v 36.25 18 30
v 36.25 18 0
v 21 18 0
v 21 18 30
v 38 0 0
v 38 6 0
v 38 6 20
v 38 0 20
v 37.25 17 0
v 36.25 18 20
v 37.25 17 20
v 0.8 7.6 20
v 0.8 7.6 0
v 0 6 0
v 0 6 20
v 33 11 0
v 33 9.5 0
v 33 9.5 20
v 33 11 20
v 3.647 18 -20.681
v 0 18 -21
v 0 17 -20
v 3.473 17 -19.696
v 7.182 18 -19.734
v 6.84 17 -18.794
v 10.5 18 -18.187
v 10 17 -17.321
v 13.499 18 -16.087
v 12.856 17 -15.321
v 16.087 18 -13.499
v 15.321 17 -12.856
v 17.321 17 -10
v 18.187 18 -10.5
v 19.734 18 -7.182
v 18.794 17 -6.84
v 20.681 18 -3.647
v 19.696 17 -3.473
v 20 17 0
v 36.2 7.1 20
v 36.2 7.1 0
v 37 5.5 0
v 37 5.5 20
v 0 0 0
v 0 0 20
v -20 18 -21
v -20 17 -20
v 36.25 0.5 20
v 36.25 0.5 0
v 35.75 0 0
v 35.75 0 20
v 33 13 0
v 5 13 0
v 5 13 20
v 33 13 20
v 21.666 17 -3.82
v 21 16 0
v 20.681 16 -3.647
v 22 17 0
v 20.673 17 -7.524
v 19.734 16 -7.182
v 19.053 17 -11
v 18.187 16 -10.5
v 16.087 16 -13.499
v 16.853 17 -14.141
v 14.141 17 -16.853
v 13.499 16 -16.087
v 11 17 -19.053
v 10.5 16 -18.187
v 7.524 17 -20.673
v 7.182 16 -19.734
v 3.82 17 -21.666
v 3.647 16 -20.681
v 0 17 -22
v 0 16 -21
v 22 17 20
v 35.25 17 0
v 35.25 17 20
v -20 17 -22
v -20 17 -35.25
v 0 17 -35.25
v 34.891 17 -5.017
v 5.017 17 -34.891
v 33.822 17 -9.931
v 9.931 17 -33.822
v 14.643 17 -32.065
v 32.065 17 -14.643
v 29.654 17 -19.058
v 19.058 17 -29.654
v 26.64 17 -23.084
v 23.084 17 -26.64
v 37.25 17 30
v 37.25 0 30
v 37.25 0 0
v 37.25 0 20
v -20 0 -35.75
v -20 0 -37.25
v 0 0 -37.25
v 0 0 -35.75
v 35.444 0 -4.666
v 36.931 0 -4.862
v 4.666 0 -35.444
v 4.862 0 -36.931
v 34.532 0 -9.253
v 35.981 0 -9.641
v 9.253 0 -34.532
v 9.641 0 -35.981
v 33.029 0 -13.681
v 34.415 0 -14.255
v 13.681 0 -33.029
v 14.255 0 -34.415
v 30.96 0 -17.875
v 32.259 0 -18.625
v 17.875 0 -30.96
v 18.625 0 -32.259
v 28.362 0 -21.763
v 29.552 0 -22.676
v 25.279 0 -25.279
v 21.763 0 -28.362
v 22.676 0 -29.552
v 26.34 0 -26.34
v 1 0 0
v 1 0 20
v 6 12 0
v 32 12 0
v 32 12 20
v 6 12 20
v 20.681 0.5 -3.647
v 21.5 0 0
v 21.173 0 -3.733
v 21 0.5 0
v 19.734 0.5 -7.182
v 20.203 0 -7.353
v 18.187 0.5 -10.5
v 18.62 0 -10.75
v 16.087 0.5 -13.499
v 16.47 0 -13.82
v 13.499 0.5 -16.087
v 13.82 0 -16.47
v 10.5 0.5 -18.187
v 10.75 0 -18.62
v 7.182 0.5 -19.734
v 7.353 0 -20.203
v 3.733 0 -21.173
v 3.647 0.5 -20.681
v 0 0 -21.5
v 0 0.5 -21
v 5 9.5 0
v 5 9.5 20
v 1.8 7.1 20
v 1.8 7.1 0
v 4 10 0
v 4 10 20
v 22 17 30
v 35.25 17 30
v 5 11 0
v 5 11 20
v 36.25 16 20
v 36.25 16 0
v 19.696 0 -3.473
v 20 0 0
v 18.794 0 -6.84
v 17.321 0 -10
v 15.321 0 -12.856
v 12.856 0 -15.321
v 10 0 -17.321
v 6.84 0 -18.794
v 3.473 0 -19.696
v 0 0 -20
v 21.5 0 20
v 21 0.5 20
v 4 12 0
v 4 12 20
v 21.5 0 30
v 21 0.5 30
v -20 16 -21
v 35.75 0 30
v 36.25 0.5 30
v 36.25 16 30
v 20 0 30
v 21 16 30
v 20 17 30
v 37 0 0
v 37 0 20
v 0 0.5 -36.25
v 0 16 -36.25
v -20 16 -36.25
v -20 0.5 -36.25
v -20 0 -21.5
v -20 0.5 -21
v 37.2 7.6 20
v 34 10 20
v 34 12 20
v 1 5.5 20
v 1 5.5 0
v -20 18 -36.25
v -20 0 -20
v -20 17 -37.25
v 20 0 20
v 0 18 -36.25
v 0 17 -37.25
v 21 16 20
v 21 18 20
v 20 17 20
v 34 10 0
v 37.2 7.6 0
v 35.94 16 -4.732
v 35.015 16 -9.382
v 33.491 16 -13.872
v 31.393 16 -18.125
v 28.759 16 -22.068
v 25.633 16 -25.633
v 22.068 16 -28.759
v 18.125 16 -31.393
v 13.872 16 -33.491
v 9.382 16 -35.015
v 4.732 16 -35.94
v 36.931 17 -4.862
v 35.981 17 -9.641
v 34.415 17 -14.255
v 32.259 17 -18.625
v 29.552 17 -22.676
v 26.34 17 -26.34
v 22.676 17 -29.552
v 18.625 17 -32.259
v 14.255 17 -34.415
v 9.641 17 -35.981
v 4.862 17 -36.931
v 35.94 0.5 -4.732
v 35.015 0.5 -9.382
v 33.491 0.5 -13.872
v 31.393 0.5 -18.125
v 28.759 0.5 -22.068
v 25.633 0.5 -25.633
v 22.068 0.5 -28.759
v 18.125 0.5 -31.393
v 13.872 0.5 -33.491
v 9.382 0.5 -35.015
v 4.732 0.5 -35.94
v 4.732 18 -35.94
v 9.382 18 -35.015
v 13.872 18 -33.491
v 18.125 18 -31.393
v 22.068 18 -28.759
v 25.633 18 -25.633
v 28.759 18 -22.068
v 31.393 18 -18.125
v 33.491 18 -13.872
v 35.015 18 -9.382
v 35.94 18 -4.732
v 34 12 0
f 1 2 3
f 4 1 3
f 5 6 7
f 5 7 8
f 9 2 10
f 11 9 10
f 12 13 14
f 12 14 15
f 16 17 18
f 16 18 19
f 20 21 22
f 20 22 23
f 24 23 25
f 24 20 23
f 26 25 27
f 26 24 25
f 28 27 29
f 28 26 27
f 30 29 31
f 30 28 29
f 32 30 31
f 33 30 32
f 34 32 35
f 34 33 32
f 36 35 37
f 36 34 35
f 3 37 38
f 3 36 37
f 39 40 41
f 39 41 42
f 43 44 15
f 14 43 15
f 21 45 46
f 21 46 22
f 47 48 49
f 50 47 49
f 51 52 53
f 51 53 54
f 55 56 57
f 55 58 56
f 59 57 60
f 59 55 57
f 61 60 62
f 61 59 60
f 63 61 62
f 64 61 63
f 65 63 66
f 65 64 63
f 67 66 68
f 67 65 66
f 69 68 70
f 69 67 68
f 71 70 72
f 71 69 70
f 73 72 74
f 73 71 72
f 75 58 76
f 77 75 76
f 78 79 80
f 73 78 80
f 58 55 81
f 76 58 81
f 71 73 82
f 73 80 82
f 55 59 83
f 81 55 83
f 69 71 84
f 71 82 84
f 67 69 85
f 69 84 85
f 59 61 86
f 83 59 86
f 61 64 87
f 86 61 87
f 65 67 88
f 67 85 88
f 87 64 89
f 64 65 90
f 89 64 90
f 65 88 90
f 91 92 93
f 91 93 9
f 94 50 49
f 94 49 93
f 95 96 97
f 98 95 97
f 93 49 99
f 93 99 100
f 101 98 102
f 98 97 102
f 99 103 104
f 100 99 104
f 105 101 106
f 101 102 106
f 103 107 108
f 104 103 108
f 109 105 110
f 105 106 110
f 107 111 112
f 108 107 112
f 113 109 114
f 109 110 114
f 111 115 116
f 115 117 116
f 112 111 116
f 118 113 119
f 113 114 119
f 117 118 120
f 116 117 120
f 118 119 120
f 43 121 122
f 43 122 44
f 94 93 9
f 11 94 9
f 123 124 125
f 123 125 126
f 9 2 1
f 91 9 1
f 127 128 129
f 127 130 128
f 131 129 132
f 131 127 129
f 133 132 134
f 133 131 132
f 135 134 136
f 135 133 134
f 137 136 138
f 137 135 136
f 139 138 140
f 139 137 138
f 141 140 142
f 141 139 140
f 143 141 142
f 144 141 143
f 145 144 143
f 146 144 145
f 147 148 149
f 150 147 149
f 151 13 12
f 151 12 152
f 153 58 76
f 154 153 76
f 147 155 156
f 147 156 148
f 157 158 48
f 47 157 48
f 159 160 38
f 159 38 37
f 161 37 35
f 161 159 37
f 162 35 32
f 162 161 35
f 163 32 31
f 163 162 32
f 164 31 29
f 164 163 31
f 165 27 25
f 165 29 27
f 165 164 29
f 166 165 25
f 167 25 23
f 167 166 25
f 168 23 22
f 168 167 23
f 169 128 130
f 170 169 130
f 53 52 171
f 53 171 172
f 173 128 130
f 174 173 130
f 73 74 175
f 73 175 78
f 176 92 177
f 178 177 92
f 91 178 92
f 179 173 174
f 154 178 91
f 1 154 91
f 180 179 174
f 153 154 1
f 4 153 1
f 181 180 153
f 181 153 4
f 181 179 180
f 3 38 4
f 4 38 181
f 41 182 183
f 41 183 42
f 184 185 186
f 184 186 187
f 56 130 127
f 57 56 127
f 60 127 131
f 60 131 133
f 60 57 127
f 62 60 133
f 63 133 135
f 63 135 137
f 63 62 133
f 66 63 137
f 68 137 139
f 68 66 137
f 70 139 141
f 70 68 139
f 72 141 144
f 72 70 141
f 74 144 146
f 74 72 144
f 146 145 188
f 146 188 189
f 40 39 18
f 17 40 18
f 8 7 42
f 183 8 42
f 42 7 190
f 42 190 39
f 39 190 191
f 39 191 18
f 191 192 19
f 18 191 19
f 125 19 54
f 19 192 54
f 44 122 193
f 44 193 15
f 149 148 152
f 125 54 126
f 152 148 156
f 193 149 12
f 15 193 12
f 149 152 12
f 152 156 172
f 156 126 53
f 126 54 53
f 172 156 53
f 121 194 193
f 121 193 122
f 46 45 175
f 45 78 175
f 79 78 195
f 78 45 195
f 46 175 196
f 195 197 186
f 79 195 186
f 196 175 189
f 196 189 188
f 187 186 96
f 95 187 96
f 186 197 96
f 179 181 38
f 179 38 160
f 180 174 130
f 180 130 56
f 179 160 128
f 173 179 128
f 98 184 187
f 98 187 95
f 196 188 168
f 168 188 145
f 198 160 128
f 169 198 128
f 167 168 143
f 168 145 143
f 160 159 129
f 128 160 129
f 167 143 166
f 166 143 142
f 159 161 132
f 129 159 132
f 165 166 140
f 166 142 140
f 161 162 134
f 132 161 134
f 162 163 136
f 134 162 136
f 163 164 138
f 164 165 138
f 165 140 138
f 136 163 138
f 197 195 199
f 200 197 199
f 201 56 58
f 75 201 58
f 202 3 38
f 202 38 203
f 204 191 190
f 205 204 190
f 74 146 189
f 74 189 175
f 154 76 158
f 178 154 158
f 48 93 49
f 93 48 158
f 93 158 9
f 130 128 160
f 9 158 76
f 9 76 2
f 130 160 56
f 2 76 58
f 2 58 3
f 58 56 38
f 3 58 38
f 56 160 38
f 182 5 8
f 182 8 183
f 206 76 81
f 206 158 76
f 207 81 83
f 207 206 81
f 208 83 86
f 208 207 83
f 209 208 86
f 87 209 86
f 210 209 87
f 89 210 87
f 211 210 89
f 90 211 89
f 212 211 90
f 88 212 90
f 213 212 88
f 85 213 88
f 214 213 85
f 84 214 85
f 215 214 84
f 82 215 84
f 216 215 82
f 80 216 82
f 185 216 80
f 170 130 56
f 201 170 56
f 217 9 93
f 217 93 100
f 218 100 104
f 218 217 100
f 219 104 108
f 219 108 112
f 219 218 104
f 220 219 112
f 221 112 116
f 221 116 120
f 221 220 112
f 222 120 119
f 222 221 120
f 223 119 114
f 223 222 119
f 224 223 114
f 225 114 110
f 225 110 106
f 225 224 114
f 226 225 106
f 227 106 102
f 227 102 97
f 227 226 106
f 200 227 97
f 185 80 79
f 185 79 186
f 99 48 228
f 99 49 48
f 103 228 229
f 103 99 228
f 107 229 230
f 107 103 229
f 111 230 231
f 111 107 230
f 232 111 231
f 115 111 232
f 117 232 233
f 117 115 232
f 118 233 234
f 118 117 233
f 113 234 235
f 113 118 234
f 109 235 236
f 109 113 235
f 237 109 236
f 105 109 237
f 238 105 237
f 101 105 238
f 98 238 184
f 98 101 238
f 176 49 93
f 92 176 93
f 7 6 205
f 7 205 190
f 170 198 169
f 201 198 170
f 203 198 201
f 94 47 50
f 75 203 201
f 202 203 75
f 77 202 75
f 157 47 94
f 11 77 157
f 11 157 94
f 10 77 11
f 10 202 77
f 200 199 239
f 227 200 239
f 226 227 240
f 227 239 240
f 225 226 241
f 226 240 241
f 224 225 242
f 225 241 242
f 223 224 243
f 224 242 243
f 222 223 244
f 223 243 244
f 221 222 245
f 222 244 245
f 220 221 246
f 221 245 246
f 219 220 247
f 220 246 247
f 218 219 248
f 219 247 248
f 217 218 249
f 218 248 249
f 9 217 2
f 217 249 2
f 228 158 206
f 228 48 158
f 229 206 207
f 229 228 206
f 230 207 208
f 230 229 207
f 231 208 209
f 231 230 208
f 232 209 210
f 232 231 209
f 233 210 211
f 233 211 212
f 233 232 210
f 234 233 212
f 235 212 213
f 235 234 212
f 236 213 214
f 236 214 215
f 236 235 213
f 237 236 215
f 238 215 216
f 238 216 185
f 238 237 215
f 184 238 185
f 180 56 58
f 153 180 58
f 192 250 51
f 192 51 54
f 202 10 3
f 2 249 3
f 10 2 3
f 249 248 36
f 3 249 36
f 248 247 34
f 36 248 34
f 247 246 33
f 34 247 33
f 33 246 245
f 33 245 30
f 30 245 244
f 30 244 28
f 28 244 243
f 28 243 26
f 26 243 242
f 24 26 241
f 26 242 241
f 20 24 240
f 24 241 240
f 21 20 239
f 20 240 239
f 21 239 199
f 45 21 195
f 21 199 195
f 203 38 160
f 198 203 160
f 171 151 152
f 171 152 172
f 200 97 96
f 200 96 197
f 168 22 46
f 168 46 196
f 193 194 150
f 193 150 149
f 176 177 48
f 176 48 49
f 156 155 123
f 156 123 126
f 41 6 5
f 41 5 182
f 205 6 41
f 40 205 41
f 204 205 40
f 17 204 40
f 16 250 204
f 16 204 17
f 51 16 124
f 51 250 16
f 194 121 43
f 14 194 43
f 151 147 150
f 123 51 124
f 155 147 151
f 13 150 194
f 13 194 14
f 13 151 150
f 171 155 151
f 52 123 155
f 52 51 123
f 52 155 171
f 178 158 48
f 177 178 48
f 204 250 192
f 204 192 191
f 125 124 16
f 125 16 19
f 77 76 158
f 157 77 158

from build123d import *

# Parameters (mm, degrees)
PAD_DEPTH        = 20
CHAMFER_SIZE     = 1
REVOLUTION_ANGLE = 90
PAD001_DEPTH     = 20
PAD002_DEPTH     = 20
CHAMFER001_SIZE  = 1
PAD003_DEPTH     = 30
CHAMFER002_SIZE  = 1


with BuildPart() as clampbody:
    # Sketch → Pad (new body)
    with BuildSketch(Plane.XY):
        Polygon((0, 0), (0, 7), (4, 10), (4, 13), (34, 13), (34, 10), (38, 7), (38, 0), (37, 0), (37, 6.5), (33, 9.5), (33, 12), (5, 12), (5, 9.5), (1, 6.5), (1, 0), align=None)
    extrude(amount=PAD_DEPTH)

    # Chamfer
    chamfer_edges = [clampbody.edges().sort_by_distance(p)[0] for p in [
        (4, 13, 10),
        (0, 7, 10),
        (34, 13, 10),
        (38, 7, 10),
        (1, 6.5, 10),
        (5, 12, 10),
        (33, 12, 10),
        (37, 6.5, 10),
    ]]
    chamfer(chamfer_edges, length=CHAMFER_SIZE)


with BuildPart() as sidecornerbody:
    # Sketch001 → Revolution (revolve)
    with BuildSketch(Plane.XY):
        Polygon((21.5, 0), (21, 0.5), (21, 16), (22, 17), (35.25, 17), (36.25, 16), (36.25, 0.5), (35.75, 0), (37.25, 0), (37.25, 18), (20, 18), (20, 0), align=None)
    revolve(axis=Axis((0, 0, 0), (0, 1, 0)), revolution_arc=REVOLUTION_ANGLE)

    # Binder → Pad001 (new body)
    with BuildSketch(Plane(origin=(0, 11.573016, -28.625), x_dir=(0, -1, 0), z_dir=(1, 0, 0))):
        Polygon((-5.426984, -6.625), (-5.426984, 6.625), (-4.426984, 7.625), (11.073016, 7.625), (11.573016, 7.125), (11.573016, 8.625), (-6.426984, 8.625), (-6.426984, -8.625), (11.573016, -8.625), (11.573016, -7.125), (11.073016, -7.625), (-4.426984, -7.625), align=None)
    extrude(amount=-PAD001_DEPTH)

    # Sketch001 → Pad002 (join)
    with BuildSketch(Plane.XY):
        Polygon((21.5, 0), (21, 0.5), (21, 16), (22, 17), (35.25, 17), (36.25, 16), (36.25, 0.5), (35.75, 0), (37.25, 0), (37.25, 18), (20, 18), (20, 0), align=None)
    extrude(amount=PAD002_DEPTH)

    # Chamfer001
    chamfer001_edges = [sidecornerbody.edges().sort_by_distance(p)[0] for p in [
        (37.25, 18, 10),
        (20, 18, 10),
    ]]
    chamfer(chamfer001_edges, length=CHAMFER001_SIZE)


with BuildPart() as connectorbody:
    # Binder001 → Pad003 (new body)
    with BuildSketch(Plane(origin=(28.625, 11.573016, 0), x_dir=(0, 1, 0), z_dir=(0, 0, 1))):
        Polygon((5.426984, 6.625), (5.426984, -6.625), (4.426984, -7.625), (-11.073016, -7.625), (-11.573016, -7.125), (-11.573016, -8.625), (6.426984, -8.625), (6.426984, 8.625), (-11.573016, 8.625), (-11.573016, 7.125), (-11.073016, 7.625), (4.426984, 7.625), align=None)
    extrude(amount=PAD003_DEPTH)

    # Chamfer002
    chamfer002_edges = [connectorbody.edges().sort_by_distance(p)[0] for p in [
        (20, 18, 15),
        (37.25, 18, 15),
    ]]
    chamfer(chamfer002_edges, length=CHAMFER002_SIZE)


solid = Compound([clampbody.part, sidecornerbody.part, connectorbody.part])
